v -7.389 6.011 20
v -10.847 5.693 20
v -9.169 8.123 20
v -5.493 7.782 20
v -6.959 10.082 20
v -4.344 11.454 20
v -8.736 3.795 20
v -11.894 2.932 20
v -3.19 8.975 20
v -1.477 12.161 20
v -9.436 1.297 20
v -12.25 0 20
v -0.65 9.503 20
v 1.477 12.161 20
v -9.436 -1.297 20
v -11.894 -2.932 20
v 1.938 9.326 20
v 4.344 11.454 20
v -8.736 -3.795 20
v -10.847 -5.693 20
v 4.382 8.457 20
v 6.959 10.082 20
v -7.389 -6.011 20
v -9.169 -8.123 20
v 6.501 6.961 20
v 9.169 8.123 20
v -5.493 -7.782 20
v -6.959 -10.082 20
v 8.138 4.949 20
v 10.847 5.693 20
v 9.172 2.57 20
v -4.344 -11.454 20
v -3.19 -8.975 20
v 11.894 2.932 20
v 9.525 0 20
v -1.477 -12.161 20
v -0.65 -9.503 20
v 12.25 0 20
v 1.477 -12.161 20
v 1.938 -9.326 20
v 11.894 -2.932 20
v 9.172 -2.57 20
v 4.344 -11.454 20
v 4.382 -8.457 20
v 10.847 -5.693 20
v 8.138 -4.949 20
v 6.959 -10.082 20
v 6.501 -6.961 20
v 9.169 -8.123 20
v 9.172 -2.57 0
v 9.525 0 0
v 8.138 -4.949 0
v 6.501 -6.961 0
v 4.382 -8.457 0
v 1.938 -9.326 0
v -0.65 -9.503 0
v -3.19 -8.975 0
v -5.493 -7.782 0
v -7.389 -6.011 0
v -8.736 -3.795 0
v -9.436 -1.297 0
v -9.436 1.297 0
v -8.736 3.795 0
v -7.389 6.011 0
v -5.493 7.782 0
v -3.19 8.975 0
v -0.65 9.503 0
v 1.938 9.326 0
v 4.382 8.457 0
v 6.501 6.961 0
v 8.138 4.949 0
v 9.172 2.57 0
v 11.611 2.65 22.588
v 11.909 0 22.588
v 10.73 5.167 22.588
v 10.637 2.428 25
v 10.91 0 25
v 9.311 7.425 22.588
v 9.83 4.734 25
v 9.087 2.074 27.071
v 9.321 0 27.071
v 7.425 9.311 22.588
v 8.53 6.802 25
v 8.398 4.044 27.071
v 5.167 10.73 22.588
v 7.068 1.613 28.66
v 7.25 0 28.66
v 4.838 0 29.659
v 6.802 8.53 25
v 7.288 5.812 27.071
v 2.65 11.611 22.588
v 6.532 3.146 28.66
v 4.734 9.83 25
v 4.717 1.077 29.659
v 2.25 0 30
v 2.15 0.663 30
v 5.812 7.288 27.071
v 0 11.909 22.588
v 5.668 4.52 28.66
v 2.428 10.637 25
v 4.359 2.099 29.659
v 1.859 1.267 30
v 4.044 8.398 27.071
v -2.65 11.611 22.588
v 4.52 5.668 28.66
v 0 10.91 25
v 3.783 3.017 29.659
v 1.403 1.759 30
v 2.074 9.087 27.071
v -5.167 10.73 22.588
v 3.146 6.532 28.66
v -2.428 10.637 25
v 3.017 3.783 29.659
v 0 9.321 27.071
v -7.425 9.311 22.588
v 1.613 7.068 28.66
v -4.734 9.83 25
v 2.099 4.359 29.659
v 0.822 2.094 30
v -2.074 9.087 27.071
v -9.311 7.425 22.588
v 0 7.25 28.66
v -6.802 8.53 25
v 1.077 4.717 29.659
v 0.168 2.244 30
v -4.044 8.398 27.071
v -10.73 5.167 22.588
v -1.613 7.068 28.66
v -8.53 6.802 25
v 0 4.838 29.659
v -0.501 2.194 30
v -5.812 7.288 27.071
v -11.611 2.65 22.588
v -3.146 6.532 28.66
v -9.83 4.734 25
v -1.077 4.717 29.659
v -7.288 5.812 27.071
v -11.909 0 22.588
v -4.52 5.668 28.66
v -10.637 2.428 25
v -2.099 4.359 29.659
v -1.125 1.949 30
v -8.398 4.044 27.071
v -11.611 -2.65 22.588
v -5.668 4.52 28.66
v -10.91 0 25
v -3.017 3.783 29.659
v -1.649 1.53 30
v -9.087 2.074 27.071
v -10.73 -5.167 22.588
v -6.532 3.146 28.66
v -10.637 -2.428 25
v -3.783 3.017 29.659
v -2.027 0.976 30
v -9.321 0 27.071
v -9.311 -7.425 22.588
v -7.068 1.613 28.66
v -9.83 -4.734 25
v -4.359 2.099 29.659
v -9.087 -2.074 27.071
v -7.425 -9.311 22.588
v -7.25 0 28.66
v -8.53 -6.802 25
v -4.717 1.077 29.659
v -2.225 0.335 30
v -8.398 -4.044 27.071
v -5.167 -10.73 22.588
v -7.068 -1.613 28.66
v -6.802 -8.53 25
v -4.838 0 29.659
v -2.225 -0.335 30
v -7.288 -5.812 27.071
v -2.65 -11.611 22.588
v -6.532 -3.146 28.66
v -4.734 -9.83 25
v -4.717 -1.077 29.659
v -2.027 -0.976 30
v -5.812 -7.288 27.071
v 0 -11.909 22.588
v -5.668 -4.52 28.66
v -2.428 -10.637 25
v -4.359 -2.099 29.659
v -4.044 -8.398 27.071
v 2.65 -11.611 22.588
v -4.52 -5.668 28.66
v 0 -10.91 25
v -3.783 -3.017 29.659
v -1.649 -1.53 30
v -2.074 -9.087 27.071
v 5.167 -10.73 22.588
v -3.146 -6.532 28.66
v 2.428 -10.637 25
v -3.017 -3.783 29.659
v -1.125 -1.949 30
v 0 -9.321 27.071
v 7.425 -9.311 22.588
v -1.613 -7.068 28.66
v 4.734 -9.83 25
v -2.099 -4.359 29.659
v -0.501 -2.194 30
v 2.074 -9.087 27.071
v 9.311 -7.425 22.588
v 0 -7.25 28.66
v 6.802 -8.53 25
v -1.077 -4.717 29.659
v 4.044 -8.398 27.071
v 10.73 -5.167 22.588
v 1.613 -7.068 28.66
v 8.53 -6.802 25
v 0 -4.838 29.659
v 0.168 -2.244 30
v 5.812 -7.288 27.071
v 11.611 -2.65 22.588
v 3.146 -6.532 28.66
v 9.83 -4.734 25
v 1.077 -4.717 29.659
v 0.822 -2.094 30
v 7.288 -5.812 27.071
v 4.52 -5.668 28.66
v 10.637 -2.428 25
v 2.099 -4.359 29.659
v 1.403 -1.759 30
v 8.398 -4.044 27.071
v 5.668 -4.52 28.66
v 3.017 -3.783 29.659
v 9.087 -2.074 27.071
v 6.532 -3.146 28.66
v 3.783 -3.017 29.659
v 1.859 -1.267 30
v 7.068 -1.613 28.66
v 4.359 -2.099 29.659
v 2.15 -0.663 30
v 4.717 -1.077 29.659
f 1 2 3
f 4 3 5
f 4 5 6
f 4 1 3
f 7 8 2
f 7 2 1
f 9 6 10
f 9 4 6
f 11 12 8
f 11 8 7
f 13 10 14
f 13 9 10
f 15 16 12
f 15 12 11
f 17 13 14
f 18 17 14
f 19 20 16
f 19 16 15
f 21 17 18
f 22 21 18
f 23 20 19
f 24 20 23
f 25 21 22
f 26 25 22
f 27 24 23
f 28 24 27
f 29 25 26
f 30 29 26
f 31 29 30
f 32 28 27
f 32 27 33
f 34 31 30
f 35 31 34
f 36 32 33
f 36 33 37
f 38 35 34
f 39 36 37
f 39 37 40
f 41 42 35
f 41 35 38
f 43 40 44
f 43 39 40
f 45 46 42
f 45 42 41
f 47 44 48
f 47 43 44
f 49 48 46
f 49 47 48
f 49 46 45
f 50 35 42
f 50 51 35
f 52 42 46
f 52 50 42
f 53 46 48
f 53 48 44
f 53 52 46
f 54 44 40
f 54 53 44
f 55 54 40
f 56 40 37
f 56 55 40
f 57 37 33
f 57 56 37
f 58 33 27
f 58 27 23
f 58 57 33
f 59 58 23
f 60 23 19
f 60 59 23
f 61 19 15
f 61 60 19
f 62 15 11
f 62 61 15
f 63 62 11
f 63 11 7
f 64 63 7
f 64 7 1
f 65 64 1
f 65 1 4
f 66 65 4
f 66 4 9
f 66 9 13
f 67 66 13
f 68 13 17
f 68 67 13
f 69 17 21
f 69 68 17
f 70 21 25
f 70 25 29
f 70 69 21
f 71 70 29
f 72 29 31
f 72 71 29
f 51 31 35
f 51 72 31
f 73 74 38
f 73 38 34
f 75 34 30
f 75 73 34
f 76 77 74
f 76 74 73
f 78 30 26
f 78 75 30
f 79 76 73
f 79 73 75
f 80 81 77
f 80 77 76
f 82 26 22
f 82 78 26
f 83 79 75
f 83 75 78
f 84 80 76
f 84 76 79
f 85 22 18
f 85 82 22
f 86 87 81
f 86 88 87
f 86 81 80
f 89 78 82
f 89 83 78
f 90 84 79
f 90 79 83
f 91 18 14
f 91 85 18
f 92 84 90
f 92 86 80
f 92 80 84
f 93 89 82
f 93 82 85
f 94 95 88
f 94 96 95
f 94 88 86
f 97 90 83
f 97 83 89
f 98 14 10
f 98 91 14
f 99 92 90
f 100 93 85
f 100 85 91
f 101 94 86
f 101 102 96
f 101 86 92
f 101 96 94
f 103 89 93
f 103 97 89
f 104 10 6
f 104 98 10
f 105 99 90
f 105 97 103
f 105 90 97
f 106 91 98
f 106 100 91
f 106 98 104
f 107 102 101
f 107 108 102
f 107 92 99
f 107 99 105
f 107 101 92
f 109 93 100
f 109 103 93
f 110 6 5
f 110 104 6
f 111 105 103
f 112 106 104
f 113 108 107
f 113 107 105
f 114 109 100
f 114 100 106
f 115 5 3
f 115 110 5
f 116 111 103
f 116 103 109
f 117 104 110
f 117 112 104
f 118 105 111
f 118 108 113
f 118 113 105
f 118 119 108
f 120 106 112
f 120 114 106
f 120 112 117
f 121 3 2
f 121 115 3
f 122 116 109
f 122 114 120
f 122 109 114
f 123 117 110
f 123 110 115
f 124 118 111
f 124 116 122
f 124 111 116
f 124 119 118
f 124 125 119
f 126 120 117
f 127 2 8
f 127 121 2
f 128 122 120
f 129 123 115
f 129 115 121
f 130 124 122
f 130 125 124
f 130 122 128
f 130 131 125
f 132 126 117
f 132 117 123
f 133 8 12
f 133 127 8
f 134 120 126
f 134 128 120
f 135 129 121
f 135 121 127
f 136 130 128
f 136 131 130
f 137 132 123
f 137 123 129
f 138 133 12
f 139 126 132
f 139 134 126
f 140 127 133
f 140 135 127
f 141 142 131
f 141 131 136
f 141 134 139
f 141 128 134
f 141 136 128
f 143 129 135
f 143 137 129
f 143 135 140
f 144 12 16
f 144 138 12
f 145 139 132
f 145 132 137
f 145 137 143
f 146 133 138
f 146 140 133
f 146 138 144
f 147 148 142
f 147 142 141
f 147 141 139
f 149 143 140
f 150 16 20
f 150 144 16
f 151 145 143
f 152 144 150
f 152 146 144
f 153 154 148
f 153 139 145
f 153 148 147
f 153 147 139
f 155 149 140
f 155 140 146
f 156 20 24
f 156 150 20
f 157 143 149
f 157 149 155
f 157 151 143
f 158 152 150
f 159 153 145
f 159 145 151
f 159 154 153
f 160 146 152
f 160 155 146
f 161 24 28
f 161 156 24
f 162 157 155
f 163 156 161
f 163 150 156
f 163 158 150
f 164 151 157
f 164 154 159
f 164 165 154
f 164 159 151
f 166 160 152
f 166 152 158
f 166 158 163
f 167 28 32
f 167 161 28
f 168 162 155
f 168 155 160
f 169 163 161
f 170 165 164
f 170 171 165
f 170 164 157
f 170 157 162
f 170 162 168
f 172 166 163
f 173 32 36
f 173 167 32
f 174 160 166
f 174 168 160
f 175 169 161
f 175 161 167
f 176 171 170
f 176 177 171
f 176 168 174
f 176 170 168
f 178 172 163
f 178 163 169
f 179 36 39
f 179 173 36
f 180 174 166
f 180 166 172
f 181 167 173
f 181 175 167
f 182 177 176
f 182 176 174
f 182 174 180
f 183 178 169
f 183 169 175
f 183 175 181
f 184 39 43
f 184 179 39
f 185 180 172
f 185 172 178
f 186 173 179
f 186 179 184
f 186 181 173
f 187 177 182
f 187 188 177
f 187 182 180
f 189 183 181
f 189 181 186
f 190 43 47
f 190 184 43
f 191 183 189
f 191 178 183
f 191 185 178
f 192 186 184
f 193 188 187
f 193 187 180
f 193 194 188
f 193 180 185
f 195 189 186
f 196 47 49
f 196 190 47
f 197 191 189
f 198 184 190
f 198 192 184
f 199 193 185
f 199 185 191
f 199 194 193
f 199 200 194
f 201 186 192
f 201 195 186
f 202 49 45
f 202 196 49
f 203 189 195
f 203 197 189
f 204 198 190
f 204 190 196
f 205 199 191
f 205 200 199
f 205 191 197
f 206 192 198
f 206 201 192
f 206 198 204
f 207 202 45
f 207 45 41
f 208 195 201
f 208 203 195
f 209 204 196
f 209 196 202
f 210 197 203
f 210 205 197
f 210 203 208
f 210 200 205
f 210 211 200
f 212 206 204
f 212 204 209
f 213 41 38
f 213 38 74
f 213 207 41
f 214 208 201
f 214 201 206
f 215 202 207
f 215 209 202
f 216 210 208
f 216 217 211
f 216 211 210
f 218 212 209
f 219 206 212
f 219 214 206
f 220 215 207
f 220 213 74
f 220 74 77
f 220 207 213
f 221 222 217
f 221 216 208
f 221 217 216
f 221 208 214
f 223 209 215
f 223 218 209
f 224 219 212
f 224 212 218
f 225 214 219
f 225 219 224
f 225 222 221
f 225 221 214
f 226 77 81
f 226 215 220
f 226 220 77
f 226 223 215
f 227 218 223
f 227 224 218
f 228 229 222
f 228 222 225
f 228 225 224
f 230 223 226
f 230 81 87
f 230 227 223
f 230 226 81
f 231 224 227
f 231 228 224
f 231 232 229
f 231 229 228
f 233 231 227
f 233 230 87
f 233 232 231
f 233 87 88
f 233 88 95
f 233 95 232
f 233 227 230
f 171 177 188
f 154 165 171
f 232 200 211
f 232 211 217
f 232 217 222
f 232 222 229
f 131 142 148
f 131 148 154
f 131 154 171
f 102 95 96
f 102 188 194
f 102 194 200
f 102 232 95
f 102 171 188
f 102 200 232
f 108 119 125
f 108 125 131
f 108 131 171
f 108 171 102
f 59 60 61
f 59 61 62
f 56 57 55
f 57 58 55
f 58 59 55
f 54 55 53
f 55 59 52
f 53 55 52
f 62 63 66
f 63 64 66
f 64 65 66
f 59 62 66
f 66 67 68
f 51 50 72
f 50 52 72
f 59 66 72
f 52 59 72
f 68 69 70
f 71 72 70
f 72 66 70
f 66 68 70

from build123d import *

# Parameters (mm, degrees)
F0_R     = 12.25
F1_DEPTH = 30
F2_R     = 12.25
F2_R_2   = 9.525
F3_DEPTH = 10
F4_DEPTH = 10
F5_R     = 9.99999


# Not quite as in the source:
# - a fillet or chamfer is up to 0.001 mm smaller than in the source, because OpenCascade refuses the exact size


with BuildPart() as f1:
    # F0 (on Top) → F1 (new body)
    with BuildSketch(Plane.XY):
        Circle(F0_R)
    extrude(amount=F1_DEPTH)

    # F2 (on face) → F3 (cut)
    with BuildSketch(Plane(origin=(0, 0, 0), x_dir=(1, 0, 0), z_dir=(0, 0, -1))):
        Circle(F2_R)
        Circle(F2_R_2, mode=Mode.SUBTRACT)
    extrude(amount=-F3_DEPTH, mode=Mode.SUBTRACT)

    # F4 (cut): a face of the model
    f4_faces = [f1.faces().sort_by_distance(p)[0] for p in [
        (-11.9035176772, 0, 10),
    ]]
    extrude(f4_faces, amount=-F4_DEPTH, mode=Mode.SUBTRACT)

    # F5 (radius 10 in the source; OpenCascade refuses exactly that, so slightly less here)
    f5_edges = [f1.edges().sort_by_distance(p)[0] for p in [
        (-12.25, 0, 30),
    ]]
    fillet(f5_edges, radius=F5_R)


solid = f1.part
